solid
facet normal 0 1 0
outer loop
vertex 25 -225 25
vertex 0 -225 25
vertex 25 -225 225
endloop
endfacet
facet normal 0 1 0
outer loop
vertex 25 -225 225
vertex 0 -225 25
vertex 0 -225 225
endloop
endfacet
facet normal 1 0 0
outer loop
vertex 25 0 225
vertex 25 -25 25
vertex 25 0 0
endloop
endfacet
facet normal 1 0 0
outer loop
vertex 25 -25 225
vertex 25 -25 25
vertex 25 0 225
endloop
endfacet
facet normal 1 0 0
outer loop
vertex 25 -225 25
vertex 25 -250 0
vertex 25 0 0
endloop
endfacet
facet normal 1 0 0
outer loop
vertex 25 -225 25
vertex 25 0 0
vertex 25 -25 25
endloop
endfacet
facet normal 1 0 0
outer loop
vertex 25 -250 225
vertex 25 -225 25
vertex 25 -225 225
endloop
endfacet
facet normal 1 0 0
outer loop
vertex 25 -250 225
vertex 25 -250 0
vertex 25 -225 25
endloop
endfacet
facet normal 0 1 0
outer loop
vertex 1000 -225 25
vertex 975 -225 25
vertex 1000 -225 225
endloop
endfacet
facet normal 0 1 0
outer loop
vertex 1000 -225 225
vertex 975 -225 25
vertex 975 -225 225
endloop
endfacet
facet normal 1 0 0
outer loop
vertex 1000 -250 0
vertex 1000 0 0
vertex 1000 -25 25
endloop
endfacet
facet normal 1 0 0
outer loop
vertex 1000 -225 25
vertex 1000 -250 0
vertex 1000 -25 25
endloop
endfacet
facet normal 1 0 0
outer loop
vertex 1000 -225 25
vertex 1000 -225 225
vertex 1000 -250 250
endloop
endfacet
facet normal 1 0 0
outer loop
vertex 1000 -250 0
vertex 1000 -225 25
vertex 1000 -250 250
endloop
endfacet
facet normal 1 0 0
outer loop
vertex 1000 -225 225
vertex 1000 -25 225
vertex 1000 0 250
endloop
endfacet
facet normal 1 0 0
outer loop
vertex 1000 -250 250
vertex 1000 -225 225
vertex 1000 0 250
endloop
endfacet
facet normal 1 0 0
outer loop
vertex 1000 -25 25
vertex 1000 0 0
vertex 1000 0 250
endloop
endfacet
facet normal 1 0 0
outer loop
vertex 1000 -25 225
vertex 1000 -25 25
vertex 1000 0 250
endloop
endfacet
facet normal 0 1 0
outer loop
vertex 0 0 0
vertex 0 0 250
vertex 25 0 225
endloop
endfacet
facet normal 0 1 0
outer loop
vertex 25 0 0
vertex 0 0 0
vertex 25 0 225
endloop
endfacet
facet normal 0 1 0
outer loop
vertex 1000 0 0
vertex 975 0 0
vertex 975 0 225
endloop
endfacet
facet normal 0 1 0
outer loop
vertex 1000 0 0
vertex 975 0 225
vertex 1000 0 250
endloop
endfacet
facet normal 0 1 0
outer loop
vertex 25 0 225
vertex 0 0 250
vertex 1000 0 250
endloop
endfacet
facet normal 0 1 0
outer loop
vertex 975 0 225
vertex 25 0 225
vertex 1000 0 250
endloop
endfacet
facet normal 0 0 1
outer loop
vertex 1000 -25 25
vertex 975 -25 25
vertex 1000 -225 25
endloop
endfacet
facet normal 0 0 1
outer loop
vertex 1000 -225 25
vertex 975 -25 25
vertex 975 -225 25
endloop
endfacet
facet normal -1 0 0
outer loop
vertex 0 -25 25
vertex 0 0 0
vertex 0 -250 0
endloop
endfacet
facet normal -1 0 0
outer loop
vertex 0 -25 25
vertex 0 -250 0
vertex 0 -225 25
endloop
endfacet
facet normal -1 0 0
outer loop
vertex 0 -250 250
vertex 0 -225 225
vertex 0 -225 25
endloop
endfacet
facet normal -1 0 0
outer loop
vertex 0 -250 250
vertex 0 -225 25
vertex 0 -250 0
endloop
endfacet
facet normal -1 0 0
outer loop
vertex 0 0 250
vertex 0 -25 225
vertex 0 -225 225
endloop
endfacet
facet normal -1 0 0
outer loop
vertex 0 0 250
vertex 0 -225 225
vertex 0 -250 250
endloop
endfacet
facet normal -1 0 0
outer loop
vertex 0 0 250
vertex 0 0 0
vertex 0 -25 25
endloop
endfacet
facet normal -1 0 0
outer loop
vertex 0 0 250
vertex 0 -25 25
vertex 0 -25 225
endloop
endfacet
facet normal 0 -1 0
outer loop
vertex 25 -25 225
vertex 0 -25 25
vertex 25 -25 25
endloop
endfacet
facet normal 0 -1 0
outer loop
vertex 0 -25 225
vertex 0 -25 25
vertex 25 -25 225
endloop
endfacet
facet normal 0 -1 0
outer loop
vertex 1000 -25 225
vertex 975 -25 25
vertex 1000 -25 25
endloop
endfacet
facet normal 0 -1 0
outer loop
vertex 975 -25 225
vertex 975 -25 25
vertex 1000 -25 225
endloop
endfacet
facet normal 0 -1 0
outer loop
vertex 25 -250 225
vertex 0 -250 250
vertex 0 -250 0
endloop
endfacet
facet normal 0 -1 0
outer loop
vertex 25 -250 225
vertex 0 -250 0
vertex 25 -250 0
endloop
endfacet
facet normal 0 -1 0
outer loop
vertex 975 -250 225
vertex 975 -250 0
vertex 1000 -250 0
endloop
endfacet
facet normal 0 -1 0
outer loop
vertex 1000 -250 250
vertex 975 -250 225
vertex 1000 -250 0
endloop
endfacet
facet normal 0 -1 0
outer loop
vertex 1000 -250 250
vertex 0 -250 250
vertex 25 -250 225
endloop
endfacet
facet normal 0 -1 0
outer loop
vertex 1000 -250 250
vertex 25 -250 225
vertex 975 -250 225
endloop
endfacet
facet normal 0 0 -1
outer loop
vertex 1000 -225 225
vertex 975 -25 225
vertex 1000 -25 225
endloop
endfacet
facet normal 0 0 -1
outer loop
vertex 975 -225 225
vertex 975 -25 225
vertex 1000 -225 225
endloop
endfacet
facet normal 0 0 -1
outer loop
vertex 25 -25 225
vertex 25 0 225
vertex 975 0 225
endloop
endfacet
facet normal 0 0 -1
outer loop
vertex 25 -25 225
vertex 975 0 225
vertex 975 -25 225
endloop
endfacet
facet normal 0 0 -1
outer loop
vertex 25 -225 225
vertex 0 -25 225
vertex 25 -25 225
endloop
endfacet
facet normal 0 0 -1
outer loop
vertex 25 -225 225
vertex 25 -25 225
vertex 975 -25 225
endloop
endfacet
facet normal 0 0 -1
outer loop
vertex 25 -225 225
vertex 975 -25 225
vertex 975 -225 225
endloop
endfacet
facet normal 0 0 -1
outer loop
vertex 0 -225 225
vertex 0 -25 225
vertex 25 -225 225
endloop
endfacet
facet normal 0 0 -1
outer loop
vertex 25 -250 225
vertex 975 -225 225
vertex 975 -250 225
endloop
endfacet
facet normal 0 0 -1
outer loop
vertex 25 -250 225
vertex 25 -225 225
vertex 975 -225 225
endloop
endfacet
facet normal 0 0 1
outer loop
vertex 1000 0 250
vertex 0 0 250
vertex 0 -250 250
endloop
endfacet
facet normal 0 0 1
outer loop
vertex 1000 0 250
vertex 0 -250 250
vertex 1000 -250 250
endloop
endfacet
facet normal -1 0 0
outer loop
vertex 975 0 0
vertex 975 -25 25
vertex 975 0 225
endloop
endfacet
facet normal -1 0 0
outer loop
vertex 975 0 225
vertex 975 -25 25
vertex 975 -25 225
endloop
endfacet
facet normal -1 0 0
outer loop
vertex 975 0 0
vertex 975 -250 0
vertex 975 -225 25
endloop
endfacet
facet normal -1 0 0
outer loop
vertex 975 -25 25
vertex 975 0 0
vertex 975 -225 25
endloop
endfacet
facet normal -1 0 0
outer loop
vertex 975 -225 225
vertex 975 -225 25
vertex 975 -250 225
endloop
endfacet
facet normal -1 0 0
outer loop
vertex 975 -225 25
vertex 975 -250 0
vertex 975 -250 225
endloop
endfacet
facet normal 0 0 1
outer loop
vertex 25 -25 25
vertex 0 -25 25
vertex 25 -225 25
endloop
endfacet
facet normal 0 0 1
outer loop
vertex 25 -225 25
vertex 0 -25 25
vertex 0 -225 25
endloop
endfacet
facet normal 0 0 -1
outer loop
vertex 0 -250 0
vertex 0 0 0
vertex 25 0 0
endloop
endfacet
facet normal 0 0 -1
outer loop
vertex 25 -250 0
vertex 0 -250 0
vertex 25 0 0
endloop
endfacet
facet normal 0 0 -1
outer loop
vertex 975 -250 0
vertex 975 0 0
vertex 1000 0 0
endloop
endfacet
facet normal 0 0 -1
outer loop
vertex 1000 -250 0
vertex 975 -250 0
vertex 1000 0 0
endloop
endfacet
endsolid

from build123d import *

# Parameters (mm, degrees)
F0_W     = 2000
F0_H     = 500
F1_DEPTH = 500
F2_W     = 1900
F2_H     = 450
F3_DEPTH = 500.001
F4_W     = 400
F4_H     = 400
F5_DEPTH = 2000.001
F6_SCALE = 0.5


with BuildPart() as f1:
    # F0 (on Front) → F1 (new body)
    with BuildSketch(Plane.XZ):
        with Locations((1000, 250)):
            Rectangle(F0_W, F0_H)
    extrude(amount=F1_DEPTH)

    # F2 (on face) → F3 (cut, through all)
    with BuildSketch(Plane.XZ.offset(500)):
        with Locations((1000, 225)):
            Rectangle(F2_W, F2_H)
    extrude(amount=-F3_DEPTH, mode=Mode.SUBTRACT)

    # F4 (on face) → F5 (cut, through all)
    with BuildSketch(Plane(origin=(0, 0, 0), x_dir=(0, -1, 0), z_dir=(-1, 0, 0))):
        with Locations((250, 250)):
            Rectangle(F4_W, F4_H)
    extrude(amount=-F5_DEPTH, mode=Mode.SUBTRACT)


with BuildPart() as f1_1:
    # F6: moved
    add(f1.part.scale(F6_SCALE))


solid = f1_1.part
